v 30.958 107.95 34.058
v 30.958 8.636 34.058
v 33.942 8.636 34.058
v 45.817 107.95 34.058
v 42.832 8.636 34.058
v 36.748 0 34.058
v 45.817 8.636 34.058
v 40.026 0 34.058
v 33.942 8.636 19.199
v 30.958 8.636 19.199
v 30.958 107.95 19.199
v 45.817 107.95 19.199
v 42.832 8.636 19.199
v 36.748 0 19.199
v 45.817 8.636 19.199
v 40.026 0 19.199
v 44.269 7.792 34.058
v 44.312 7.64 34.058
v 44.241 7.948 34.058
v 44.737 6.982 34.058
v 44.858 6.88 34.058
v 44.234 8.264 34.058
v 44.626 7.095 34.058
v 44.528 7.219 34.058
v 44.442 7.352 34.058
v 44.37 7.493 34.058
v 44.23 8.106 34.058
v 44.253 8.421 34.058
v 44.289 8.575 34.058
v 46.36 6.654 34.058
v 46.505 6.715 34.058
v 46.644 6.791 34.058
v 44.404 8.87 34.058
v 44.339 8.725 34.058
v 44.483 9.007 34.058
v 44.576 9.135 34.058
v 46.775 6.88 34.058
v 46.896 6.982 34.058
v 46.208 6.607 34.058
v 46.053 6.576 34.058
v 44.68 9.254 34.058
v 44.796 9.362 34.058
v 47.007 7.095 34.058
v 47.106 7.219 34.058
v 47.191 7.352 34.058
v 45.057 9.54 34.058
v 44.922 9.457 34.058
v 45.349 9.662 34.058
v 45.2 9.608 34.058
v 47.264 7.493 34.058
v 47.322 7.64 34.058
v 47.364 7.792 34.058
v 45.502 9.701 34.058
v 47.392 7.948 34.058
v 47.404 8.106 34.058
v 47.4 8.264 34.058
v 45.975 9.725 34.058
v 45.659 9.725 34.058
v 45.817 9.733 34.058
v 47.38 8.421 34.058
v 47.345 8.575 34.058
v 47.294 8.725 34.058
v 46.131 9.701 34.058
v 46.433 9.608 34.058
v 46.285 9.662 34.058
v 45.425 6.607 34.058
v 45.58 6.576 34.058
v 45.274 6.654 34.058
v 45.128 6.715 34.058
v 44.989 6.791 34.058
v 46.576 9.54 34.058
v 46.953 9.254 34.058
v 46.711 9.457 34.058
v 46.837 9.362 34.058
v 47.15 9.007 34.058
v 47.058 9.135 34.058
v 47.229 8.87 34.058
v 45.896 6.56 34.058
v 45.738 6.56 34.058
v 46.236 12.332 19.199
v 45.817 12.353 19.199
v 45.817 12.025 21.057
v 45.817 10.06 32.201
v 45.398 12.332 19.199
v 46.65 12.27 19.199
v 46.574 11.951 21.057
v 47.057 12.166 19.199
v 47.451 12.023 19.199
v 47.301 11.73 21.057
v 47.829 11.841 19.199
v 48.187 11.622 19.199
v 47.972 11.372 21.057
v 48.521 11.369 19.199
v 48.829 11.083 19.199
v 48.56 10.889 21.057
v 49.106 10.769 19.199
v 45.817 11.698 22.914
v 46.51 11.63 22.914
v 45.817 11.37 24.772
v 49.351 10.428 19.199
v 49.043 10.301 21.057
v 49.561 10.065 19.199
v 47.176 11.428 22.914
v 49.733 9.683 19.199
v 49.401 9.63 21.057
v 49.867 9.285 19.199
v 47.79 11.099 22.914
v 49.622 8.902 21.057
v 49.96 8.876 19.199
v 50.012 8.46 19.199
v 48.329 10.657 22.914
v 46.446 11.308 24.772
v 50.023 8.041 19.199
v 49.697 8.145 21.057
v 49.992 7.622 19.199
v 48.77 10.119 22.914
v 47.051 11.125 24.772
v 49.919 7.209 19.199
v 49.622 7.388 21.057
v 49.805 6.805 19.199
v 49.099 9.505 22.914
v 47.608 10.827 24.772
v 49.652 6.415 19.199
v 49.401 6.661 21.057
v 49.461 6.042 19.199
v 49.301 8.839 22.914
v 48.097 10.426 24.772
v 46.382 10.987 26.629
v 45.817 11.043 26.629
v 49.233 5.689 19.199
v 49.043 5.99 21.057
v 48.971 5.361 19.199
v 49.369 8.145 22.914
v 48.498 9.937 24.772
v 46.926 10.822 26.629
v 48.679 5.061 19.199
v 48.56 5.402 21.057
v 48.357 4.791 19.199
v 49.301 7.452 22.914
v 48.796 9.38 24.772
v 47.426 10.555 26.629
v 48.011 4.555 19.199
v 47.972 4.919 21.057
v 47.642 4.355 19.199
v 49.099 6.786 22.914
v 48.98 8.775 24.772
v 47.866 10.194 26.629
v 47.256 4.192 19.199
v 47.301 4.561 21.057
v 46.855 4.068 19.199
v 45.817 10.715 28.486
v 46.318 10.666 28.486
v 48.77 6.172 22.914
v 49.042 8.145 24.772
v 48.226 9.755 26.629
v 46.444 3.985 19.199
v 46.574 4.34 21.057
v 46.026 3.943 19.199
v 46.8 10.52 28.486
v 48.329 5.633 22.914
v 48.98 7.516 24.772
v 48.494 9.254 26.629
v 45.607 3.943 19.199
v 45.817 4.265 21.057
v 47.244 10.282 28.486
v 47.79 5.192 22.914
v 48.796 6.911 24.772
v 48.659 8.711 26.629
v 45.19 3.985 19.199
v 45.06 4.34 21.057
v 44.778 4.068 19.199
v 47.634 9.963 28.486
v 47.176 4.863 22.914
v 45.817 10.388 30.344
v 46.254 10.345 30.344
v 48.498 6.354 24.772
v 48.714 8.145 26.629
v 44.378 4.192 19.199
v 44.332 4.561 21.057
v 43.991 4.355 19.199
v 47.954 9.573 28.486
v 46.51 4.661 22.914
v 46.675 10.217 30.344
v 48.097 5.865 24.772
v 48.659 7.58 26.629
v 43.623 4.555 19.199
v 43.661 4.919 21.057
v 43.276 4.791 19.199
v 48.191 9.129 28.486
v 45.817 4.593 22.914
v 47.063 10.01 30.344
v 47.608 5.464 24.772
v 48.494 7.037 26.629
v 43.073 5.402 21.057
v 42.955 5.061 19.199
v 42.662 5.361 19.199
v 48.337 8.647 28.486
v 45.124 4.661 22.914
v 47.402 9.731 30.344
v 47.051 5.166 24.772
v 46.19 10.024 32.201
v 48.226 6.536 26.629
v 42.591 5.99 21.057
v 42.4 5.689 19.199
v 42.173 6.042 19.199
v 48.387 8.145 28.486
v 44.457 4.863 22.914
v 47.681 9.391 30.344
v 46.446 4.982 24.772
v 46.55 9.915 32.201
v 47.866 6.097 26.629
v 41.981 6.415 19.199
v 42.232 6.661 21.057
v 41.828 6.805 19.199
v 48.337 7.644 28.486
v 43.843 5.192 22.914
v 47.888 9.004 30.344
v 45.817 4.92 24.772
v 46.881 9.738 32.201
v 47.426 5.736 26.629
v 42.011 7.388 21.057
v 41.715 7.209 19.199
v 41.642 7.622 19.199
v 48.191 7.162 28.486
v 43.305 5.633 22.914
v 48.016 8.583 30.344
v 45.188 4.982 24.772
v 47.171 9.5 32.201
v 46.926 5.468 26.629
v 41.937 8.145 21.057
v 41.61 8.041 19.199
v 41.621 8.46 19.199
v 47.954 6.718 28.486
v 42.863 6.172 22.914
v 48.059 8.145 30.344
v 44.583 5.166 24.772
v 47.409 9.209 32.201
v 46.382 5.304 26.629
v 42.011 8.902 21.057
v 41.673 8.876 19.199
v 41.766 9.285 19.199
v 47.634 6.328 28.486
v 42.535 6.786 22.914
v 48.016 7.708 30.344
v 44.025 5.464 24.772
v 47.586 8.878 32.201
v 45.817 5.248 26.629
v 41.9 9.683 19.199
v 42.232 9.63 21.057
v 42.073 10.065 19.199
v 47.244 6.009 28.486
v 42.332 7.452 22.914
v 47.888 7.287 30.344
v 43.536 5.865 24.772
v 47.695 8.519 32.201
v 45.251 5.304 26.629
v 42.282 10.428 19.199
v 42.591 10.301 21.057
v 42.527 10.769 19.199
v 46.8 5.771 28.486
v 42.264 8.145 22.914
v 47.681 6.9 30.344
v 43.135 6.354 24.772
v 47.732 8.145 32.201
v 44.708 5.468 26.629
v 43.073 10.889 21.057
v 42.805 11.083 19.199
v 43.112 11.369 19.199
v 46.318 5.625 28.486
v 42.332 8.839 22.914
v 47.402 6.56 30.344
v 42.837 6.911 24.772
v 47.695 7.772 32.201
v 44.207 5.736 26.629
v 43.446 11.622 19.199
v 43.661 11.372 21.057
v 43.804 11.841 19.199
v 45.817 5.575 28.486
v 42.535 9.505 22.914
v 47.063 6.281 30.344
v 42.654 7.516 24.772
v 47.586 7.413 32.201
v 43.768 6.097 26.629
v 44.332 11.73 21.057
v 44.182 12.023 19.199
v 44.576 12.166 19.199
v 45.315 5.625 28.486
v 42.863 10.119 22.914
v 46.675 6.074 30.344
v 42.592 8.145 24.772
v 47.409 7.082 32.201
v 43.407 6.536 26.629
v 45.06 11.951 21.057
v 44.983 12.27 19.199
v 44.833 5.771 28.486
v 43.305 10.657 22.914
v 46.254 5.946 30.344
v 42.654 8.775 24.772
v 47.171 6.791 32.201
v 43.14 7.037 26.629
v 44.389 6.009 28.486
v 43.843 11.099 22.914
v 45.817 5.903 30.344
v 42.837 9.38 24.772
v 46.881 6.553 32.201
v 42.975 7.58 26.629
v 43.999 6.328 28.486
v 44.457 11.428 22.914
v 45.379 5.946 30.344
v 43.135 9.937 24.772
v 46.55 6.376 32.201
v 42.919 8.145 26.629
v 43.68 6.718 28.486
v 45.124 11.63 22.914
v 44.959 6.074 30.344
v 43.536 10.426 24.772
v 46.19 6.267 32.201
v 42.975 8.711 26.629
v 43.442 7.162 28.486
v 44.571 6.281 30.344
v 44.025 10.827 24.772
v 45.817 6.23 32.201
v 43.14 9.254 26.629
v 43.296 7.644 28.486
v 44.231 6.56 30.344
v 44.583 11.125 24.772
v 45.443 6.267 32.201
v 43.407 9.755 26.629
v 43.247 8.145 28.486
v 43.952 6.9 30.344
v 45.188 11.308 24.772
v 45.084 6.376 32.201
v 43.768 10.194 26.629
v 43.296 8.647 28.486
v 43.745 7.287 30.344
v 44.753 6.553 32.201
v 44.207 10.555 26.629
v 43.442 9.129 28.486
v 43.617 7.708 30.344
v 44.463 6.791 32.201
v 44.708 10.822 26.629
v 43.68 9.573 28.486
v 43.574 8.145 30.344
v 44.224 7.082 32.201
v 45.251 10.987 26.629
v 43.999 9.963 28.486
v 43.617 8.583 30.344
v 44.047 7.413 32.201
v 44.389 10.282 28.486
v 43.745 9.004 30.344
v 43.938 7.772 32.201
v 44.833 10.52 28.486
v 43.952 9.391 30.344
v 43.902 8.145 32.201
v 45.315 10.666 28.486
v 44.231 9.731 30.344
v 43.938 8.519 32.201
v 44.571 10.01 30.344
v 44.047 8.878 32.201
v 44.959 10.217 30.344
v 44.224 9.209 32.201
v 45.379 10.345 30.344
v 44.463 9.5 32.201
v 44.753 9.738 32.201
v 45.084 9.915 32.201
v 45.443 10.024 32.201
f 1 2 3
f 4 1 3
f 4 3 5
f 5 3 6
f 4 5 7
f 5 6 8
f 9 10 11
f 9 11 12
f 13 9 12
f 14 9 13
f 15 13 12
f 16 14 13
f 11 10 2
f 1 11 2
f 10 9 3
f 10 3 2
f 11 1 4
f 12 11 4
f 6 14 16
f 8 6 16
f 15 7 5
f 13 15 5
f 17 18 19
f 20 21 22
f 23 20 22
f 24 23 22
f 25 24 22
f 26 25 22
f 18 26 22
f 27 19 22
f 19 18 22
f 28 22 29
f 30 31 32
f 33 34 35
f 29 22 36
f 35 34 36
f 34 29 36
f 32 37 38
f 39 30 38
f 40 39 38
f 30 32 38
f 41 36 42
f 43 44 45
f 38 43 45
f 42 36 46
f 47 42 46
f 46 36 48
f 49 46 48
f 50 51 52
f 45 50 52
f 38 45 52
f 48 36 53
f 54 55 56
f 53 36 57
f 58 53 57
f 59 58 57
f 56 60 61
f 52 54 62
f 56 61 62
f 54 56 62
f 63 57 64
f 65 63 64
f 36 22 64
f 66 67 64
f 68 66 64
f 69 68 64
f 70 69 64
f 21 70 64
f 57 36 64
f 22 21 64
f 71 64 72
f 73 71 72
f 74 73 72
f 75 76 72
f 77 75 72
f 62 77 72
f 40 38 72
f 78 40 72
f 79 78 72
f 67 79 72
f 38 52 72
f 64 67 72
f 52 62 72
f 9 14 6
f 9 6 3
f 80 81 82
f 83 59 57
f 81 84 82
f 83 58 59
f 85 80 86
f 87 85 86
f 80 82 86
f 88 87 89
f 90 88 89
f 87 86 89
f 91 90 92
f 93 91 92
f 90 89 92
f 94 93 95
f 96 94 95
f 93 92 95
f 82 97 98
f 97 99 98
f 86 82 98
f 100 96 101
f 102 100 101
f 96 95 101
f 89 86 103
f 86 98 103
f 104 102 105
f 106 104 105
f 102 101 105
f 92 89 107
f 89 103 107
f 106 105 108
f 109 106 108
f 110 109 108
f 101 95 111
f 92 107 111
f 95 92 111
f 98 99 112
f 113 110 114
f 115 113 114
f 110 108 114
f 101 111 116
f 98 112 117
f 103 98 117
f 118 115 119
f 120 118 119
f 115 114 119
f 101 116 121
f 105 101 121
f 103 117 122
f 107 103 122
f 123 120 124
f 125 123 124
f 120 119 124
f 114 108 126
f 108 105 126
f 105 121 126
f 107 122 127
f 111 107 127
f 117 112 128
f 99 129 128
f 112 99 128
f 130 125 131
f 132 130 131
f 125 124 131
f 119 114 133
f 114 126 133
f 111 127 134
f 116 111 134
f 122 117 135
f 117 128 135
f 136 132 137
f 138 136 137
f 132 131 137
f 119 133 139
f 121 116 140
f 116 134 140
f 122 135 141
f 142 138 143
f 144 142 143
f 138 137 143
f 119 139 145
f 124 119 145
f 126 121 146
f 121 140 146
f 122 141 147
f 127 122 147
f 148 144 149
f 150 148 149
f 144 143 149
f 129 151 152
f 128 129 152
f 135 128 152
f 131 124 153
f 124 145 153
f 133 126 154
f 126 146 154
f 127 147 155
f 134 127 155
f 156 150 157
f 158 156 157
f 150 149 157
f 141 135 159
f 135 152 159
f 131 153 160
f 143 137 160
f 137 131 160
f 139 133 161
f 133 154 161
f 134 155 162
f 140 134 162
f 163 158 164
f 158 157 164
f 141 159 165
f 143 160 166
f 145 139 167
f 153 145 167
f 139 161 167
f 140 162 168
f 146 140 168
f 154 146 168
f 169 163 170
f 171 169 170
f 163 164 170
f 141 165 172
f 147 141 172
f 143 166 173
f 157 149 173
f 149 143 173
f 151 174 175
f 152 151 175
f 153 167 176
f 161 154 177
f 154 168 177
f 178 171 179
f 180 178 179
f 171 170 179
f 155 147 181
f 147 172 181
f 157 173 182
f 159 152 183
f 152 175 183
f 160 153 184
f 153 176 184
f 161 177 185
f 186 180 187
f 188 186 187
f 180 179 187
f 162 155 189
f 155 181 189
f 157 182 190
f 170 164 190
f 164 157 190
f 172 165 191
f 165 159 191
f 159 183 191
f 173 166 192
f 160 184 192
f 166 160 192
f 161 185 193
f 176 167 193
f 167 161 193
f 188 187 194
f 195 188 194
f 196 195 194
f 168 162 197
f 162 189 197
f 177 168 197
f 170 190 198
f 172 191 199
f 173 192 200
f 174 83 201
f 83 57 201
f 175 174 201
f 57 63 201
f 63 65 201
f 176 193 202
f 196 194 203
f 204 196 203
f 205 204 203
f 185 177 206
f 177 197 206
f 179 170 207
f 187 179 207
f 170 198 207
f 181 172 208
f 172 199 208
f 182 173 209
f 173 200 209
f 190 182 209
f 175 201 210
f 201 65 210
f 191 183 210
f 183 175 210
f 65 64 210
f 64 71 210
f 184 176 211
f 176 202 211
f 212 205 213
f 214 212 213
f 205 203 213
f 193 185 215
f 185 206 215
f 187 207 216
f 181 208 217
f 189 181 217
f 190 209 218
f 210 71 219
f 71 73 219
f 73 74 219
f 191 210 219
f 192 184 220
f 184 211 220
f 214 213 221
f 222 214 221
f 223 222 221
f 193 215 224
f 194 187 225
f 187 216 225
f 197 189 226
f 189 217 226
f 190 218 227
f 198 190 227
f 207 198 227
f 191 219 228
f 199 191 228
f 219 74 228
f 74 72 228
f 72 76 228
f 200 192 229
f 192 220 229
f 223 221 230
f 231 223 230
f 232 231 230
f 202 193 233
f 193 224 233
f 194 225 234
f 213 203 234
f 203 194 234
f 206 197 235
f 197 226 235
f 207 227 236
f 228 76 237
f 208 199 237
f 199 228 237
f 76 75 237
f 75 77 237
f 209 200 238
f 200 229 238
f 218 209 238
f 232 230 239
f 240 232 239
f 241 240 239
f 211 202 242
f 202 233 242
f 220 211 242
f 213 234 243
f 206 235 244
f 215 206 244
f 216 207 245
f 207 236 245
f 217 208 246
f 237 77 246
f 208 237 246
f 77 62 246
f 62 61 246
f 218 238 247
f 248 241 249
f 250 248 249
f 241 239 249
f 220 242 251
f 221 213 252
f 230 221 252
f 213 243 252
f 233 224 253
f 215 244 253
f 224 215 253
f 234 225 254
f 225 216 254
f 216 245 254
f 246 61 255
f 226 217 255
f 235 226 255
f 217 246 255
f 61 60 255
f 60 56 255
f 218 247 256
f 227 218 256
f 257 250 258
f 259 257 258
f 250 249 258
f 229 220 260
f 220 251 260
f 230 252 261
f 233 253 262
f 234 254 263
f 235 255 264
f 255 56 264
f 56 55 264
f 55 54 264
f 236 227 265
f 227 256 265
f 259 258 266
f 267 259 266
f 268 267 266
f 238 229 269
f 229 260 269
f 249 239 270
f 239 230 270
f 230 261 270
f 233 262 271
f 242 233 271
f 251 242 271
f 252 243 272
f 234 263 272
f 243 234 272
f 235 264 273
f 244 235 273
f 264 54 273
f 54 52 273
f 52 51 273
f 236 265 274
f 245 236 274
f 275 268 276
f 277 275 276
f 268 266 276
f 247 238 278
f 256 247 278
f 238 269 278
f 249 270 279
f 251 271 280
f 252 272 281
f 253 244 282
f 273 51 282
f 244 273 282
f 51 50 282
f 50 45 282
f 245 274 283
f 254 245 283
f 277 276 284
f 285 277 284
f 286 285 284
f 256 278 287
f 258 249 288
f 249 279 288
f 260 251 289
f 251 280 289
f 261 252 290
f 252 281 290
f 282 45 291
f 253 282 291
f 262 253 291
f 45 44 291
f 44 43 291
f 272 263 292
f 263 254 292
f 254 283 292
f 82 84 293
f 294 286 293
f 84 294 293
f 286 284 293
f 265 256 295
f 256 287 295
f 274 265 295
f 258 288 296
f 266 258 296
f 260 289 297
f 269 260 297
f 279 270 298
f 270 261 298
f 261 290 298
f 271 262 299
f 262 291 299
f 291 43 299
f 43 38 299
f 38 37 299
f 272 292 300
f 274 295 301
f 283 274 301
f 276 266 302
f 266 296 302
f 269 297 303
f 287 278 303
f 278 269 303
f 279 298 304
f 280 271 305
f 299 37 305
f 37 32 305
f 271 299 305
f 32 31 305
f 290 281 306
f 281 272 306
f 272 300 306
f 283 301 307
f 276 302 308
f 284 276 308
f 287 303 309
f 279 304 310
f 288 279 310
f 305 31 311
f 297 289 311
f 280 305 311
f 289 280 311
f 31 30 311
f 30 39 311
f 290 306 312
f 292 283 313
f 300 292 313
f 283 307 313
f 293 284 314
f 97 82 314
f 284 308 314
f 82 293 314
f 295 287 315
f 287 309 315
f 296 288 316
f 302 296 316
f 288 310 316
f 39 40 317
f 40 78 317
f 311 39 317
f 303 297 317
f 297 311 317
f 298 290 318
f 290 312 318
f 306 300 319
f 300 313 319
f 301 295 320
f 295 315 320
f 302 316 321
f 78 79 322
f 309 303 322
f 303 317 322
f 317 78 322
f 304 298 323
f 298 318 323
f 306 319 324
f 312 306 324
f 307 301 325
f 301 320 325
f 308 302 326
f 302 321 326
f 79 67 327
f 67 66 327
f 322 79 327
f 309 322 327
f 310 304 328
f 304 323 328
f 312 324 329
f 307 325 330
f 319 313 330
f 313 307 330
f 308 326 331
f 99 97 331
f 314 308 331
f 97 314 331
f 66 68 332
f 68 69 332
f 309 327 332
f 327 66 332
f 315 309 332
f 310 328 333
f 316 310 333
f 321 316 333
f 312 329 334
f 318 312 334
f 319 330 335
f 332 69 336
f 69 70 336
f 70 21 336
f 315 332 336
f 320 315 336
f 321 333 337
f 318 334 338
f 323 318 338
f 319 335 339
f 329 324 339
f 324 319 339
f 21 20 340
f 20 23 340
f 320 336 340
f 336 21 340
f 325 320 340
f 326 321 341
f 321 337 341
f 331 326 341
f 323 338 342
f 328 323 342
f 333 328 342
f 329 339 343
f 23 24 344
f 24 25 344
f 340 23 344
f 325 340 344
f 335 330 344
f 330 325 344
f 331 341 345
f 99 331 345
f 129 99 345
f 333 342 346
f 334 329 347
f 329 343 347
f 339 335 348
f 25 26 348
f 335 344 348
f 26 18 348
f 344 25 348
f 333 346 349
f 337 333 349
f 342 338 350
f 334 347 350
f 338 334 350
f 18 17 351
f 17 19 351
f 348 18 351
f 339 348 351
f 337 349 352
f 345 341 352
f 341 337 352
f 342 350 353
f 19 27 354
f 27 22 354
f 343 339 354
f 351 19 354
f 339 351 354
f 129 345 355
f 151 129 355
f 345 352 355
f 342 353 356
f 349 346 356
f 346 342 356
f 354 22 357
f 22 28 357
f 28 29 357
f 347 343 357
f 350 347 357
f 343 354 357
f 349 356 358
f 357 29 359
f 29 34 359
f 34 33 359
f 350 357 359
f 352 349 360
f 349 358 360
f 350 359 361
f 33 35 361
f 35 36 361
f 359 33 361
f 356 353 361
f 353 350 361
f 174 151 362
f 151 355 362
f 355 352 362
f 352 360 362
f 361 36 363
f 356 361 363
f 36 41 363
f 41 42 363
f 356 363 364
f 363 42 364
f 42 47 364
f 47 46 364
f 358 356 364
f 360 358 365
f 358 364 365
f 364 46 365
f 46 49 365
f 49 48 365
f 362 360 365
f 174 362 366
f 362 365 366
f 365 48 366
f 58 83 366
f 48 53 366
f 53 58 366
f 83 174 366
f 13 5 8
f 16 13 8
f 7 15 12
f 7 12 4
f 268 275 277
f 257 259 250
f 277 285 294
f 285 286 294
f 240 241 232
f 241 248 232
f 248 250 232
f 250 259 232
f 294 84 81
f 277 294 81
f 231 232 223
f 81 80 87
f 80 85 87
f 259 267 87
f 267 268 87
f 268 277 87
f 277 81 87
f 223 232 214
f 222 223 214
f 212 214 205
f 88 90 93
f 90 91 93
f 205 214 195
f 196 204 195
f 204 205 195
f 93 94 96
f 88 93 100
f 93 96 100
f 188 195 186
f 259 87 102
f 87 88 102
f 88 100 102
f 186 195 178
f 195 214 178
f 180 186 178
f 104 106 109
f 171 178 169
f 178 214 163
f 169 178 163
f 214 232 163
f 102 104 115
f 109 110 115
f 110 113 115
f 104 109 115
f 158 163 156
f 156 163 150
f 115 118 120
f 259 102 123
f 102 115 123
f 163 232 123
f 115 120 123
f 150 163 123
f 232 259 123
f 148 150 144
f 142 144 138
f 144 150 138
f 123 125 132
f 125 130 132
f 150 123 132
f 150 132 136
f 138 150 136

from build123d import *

# Parameters (mm, degrees)
F4_W      = 14.859
F4_H      = 14.859
F5_DEPTH  = 107.95
F10_DEPTH = 14.859


# Not quite as in the source:
# - a length typed as a fraction of an inch, garbled in the dataset ("3 / 203.2 mm" for 3/8 in), is restored


with BuildPart() as f5:
    # F4 (on Front) → F5 (new body)
    with BuildSketch(Plane.XZ):
        with Locations((38.387173794, 26.6289538287)):
            Rectangle(F4_W, F4_H)
    extrude(amount=-F5_DEPTH)

    # F6 (on face) → F10 (cut, through all)
    with BuildSketch(Plane.XY.offset(34.0584538287)):
        Polygon((30.957673794, 0), (36.7481802907, 0), (33.942173794, 8.636), (30.957673794, 8.636), align=None)
        Polygon((42.832173794, 8.636), (40.0261672974, 0), (45.816673794, 0), (45.816673794, 8.636), align=None)
    extrude(amount=-F10_DEPTH, mode=Mode.SUBTRACT)


with BuildPart() as f9:
    # F8 (on face) → F9 (revolve)
    with BuildSketch(Plane.YZ.offset(45.816673794)):
        Polygon((12.3529781278, 19.1994538287), (9.7329355214, 34.0584538287), (8.1454355214, 34.0584538287), (8.1454355214, 19.1994538287), align=None)
    revolve(axis=Axis((45.816673794, 8.1454355214, 26.6289538287), (0, 0, -1)))


solid = Compound([f5.part, f9.part])
